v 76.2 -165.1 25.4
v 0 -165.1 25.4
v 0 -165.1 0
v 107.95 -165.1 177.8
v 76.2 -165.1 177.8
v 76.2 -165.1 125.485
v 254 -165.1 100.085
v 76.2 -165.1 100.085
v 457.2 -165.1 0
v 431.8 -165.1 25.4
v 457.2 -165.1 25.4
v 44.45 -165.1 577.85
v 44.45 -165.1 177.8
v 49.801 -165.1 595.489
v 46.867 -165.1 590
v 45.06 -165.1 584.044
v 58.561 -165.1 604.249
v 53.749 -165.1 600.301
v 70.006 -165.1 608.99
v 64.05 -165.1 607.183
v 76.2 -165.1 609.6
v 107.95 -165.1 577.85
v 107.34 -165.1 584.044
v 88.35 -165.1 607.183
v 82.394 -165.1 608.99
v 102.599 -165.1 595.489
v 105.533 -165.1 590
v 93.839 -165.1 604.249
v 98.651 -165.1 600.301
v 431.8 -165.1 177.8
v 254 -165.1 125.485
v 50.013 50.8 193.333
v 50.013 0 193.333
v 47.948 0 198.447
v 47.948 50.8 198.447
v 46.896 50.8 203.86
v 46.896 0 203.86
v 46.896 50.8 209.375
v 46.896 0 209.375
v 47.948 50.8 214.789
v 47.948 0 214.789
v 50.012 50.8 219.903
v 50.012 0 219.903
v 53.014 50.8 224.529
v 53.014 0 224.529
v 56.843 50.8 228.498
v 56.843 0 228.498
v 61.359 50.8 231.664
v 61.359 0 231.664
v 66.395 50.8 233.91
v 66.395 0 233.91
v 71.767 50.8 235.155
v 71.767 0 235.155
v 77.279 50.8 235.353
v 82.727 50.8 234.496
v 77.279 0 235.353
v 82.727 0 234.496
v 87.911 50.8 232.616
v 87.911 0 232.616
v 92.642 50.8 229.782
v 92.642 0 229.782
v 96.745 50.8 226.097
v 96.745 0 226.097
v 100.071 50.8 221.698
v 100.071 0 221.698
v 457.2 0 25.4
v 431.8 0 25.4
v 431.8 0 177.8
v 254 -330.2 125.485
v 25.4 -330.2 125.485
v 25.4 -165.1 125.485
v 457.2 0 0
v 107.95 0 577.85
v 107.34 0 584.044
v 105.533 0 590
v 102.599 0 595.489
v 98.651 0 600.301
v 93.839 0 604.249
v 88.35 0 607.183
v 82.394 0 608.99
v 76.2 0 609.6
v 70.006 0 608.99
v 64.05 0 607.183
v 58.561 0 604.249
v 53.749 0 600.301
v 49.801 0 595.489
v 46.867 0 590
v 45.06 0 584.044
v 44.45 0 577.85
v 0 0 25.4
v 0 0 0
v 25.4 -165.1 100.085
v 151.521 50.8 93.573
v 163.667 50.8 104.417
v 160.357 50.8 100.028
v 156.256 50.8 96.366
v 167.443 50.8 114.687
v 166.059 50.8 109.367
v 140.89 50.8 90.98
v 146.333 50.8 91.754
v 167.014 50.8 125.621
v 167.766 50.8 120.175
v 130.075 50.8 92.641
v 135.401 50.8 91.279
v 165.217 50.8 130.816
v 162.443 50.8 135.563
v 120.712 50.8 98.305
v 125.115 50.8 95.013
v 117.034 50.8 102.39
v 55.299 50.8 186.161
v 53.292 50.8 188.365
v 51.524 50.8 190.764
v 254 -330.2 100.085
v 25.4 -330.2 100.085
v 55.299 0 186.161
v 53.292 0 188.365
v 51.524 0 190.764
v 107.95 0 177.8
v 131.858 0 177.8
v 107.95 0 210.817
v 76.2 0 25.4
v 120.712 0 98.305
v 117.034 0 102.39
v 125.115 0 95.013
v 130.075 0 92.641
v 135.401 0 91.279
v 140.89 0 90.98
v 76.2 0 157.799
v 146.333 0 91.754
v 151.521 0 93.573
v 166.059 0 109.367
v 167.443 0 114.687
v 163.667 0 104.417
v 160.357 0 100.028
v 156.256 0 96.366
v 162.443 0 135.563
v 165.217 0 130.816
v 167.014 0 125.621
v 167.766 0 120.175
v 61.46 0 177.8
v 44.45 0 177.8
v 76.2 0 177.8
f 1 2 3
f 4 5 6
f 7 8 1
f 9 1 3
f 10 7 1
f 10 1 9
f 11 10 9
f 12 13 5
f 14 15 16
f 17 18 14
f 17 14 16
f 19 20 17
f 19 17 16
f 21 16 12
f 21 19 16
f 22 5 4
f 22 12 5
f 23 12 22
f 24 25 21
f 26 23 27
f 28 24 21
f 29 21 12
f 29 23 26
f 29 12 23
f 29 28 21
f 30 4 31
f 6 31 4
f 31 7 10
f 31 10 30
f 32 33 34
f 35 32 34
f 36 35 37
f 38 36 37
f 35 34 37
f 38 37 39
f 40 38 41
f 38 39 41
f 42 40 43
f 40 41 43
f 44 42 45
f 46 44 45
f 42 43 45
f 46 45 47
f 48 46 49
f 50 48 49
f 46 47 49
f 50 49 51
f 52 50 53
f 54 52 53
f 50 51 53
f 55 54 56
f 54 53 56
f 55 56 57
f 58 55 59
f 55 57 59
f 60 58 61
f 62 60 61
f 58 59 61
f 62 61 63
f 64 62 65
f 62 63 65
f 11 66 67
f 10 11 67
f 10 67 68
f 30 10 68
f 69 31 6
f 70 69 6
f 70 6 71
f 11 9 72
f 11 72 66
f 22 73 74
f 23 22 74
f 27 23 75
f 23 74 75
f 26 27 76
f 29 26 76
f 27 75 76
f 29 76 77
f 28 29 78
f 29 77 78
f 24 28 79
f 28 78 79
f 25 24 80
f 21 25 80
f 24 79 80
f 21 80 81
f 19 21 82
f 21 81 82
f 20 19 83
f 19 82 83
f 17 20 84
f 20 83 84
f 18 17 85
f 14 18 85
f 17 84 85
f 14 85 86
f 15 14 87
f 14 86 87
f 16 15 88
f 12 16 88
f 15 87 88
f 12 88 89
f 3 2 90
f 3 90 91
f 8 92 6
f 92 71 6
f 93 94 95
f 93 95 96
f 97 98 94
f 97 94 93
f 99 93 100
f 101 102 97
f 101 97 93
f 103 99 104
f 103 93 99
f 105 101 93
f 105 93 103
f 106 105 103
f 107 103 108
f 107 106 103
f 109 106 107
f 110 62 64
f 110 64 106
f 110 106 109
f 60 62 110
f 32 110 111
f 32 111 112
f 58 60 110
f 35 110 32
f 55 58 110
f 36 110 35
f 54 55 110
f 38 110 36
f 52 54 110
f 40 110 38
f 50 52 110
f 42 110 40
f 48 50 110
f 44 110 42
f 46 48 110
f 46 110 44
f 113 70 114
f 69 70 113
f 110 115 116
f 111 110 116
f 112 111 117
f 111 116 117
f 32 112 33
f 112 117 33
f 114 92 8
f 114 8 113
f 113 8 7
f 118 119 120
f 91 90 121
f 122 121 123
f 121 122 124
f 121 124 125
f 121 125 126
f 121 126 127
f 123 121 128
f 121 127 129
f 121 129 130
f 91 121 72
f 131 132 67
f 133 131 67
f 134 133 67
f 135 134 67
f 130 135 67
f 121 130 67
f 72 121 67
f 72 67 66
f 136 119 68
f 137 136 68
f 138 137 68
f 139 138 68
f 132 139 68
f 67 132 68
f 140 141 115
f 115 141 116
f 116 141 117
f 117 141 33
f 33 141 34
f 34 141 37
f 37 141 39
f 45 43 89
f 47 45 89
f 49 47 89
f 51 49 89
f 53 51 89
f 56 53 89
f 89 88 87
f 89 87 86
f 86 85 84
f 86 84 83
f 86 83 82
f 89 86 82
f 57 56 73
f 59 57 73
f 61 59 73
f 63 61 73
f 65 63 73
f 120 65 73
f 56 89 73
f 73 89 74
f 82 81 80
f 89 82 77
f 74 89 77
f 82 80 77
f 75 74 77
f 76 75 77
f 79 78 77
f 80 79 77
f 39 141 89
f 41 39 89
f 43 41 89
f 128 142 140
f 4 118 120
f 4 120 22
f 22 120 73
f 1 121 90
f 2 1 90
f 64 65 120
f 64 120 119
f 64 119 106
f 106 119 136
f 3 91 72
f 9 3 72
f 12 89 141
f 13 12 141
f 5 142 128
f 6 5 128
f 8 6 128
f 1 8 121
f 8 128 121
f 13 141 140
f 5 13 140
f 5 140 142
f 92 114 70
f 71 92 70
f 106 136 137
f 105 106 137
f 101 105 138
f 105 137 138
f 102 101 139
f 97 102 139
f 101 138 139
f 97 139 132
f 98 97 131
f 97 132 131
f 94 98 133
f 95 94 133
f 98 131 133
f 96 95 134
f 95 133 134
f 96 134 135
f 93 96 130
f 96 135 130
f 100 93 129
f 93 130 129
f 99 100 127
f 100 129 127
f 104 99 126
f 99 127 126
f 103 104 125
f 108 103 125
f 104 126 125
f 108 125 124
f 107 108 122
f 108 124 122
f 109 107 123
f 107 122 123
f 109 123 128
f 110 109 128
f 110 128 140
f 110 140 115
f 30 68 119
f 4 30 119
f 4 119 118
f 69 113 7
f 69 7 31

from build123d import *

# Parameters (mm, degrees)
F1_DEPTH = 165.1
F2_W     = 177.8
F2_H     = 25.4
F2_W_2   = 50.8
F3_DEPTH = 165.1
F5_DEPTH = 50.8


with BuildPart() as f1:
    # F0 (on Front) → F1 (new body)
    with BuildSketch(Plane.XZ):
        with BuildLine():
            Line((0, 25.4), (0, 0))
            Line((0, 0), (457.2, 0))
            Line((457.2, 0), (457.2, 25.4))
            Line((457.2, 25.4), (431.8, 25.4))
            Line((431.8, 25.4), (431.8, 177.8))
            Line((431.8, 177.8), (107.95, 177.8))
            Line((107.95, 177.8), (107.95, 577.85))
            ThreePointArc((107.95, 577.85), (76.2, 609.6), (44.45, 577.85))
            Line((44.45, 577.85), (44.45, 177.8))
            Line((44.45, 177.8), (76.2, 177.8))
            Line((76.2, 177.8), (76.2, 25.4))
            Line((76.2, 25.4), (0, 25.4))
        make_face()
    extrude(amount=F1_DEPTH)

    # F2 (on face) → F3 (join)
    with BuildSketch(Plane.XZ.offset(165.1)):
        with Locations((165.1, 112.78545)):
            Rectangle(F2_W, F2_H)
        with Locations((50.8, 112.78545)):
            Rectangle(F2_W_2, F2_H)
    extrude(amount=F3_DEPTH)

    # F4 (on face) → F5 (join)
    with BuildSketch(Plane(origin=(0, 0, 0), x_dir=(-1, 0, 0), z_dir=(0, 1, 0))):
        with BuildLine():
            Line((-50.013161, 193.333121), (-55.298633, 186.161049))
            ThreePointArc((-55.298633, 186.161049), (-52.376747, 189.541366), (-50.013161, 193.333121))
        make_face()
        with BuildLine():
            Line((-117.033699, 102.390224), (-55.298633, 186.161049))
            Line((-55.298633, 186.161049), (-50.013161, 193.333121))
            ThreePointArc((-50.013161, 193.333121), (-61.358561, 231.663771), (-100.070771, 221.697747))
            Line((-100.070771, 221.697747), (-162.443357, 135.562881))
            ThreePointArc((-162.443357, 135.562881), (-156.255653, 96.366456), (-117.033699, 102.390224))
        make_face()
    extrude(amount=F5_DEPTH)


solid = f1.part
